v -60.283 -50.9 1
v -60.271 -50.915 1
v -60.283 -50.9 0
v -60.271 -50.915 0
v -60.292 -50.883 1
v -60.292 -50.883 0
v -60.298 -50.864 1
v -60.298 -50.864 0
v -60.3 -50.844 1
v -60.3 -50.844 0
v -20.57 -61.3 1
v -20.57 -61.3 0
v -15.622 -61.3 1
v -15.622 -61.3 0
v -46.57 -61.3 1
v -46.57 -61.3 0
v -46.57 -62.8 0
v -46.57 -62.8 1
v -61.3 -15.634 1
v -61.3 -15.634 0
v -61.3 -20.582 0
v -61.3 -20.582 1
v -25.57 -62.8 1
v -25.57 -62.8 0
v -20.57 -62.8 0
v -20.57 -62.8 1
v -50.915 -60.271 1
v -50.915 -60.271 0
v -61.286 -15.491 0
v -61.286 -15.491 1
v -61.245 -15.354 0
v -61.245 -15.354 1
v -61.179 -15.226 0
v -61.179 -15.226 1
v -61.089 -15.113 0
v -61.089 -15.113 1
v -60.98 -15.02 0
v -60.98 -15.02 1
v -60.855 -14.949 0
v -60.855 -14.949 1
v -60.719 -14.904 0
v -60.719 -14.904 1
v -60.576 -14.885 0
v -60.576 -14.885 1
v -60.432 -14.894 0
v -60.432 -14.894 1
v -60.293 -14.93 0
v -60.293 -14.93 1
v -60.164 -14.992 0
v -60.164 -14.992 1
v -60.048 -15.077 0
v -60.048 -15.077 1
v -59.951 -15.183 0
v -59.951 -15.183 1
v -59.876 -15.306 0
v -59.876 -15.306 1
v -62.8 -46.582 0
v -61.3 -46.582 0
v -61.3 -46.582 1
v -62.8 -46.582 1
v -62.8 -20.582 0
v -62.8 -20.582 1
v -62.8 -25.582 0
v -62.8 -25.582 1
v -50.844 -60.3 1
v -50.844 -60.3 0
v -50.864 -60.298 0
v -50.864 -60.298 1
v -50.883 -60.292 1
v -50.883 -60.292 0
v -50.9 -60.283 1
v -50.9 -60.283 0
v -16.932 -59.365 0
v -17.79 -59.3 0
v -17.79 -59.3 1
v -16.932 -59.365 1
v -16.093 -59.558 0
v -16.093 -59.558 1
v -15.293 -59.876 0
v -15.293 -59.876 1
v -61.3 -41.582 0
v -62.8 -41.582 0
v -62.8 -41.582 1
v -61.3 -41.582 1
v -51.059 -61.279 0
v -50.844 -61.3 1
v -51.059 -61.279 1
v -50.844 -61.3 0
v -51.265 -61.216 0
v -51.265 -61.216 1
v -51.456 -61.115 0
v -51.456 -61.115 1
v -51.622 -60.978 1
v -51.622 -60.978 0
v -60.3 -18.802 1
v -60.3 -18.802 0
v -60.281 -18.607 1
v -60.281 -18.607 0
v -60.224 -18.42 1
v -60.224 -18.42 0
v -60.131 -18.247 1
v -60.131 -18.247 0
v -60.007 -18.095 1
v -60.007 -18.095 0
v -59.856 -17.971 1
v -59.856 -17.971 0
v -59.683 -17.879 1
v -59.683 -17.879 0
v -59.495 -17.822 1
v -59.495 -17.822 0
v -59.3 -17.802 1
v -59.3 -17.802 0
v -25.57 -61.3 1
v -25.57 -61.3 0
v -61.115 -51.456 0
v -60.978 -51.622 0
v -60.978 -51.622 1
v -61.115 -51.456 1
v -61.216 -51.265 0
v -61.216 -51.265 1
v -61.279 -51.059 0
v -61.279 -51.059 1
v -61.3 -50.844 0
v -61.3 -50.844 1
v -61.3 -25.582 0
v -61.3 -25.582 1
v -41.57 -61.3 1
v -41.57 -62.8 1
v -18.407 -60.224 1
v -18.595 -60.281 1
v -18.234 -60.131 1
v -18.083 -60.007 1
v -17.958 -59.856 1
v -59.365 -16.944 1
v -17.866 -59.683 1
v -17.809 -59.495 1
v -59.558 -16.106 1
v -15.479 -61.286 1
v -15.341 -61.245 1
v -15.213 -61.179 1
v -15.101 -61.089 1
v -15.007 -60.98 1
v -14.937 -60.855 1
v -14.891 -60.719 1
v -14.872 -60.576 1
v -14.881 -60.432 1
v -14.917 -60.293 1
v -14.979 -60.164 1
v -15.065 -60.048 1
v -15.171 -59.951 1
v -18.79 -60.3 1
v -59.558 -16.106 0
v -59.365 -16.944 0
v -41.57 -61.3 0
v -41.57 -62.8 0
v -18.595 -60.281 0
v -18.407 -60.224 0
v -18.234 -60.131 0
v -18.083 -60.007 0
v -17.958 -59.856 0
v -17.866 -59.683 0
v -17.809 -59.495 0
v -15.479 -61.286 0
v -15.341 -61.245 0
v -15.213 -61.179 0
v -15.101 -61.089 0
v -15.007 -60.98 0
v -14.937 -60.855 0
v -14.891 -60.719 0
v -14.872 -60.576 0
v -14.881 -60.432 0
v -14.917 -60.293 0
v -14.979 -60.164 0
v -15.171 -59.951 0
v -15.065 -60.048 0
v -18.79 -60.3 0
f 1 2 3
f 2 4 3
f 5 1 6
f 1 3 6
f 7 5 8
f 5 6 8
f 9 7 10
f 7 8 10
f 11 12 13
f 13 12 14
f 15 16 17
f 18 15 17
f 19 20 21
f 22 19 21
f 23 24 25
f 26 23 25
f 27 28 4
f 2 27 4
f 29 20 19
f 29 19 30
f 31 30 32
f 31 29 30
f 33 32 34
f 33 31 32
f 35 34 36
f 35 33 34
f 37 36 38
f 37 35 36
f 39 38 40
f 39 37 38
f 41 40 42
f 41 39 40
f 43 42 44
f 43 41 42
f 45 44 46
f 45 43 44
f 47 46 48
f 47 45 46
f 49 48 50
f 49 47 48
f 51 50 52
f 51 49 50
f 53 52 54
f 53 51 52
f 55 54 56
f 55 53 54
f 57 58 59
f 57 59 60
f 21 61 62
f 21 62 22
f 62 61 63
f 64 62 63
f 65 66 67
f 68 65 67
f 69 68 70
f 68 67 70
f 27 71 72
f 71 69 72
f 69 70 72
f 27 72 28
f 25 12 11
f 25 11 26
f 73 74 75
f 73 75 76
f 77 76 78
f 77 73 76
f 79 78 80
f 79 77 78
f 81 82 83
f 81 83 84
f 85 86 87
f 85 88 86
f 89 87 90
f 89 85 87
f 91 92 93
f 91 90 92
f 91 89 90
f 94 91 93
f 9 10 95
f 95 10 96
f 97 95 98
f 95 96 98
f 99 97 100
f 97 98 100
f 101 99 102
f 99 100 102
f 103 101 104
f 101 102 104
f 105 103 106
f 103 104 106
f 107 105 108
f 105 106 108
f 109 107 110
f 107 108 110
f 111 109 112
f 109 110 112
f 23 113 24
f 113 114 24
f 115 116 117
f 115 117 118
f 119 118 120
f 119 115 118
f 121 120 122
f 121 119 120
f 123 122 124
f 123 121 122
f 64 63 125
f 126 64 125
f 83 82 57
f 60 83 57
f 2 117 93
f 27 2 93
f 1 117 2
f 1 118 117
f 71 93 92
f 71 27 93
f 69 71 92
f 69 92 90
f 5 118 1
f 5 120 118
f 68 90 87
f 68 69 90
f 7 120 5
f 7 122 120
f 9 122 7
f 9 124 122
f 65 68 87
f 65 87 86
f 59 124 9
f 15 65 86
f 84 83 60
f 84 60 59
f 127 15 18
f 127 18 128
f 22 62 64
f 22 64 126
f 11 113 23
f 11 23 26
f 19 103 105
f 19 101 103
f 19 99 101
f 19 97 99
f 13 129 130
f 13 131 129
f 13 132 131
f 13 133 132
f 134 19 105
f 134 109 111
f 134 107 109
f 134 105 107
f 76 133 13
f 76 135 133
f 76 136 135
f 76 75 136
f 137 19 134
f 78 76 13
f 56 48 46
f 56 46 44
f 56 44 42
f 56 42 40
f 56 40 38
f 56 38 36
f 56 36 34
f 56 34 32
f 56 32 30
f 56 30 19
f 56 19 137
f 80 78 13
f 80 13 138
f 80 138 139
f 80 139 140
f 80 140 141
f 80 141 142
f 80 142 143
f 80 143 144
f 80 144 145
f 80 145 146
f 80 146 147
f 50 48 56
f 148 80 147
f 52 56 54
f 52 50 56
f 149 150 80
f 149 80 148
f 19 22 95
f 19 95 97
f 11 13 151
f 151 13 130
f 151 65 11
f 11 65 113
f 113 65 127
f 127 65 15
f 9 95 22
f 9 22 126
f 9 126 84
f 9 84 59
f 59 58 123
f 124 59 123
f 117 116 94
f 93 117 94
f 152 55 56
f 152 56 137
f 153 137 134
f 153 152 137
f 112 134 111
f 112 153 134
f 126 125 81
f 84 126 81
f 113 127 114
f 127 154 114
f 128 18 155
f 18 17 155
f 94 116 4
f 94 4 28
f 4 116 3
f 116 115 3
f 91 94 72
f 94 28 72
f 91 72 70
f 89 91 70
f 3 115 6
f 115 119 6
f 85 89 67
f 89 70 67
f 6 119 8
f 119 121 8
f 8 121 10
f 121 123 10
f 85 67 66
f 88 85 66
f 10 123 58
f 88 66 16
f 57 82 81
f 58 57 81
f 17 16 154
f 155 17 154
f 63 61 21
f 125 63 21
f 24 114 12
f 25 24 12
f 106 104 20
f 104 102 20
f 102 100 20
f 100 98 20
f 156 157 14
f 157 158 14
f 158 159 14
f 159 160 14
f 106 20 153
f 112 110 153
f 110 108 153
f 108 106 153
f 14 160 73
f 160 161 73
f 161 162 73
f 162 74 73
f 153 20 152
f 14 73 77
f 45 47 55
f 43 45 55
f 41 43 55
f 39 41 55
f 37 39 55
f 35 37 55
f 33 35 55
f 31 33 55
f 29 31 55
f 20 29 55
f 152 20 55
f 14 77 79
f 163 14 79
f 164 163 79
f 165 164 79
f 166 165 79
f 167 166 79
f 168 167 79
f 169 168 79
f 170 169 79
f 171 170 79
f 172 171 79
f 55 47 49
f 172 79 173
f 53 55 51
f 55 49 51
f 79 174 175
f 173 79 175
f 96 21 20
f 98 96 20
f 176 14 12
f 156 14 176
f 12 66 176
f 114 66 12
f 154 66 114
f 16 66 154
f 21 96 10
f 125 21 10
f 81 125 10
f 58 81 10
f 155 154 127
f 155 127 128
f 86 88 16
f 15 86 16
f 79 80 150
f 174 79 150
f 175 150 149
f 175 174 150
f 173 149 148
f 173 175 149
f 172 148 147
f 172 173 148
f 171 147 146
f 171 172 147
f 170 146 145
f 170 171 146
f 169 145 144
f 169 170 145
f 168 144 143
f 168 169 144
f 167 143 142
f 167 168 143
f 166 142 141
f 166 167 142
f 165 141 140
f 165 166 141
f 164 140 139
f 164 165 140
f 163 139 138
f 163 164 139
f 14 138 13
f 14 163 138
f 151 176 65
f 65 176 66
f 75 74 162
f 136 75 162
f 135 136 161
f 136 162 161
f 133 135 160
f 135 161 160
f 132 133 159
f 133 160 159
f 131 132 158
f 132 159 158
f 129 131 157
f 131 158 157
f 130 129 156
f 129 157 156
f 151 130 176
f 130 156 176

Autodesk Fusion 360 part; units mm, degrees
sketch "Sketch1" plane through (0, 0, 0) normal (0, 0, 1) x (1, 0, 0)
  line L0 (-60.9778, -51.3602) -> (-51.369, -60.969)
  arc A0 (-51.369, -60.969) -> (-50.57, -61.3) centre (-50.57, -60.17) ccw
  line L1 (-50.8444, -61.3) -> (-15.6217, -61.3)
  arc A1 (-15.2933, -59.8758) -> (-17.7897, -59.3) centre (-17.7897, -65) ccw
  arc A2 (-18.7897, -60.3) -> (-17.7897, -59.3) centre (-18.7897, -59.3) ccw
  line L2 (-18.7897, -60.3) -> (-50.8444, -60.3)
  arc A3 (-50.6619, -60.2619) -> (-50.57, -60.3) centre (-50.57, -60.17) ccw
  line L3 (-50.6619, -60.2619) -> (-60.2707, -50.6531)
  arc A4 (-60.3, -50.5824) -> (-60.2707, -50.6531) centre (-60.2, -50.5824) ccw
  line L4 (-60.3, -50.8444) -> (-60.3, -18.8024)
  arc A5 (-59.3, -17.8024) -> (-60.3, -18.8024) centre (-59.3, -18.8024) ccw
  arc A6 (-59.3, -17.8024) -> (-59.8758, -15.306) centre (-65, -17.8024) ccw
  line L5 (-61.3, -15.6345) -> (-61.3, -50.8444)
  arc A7 (-61.3, -50.5824) -> (-60.9778, -51.3602) centre (-60.2, -50.5824) ccw
  arc A8 (-15.6217, -61.3) -> (-15.2933, -59.8758) centre (-15.6217, -60.55) ccw
  arc A9 (-59.8758, -15.306) -> (-61.3, -15.6345) centre (-60.55, -15.6345) ccw
  line L6 (-62.8, -15.6345) -> (-62.8, -50.8444)
  line L7 (-50.8444, -62.8) -> (-15.6217, -62.8)
  line L8 (-61.3, -46.5824) -> (-62.8, -46.5824)
  line L9 (-62.8, -41.5824) -> (-61.3, -41.5824)
  line L10 (-62.8, -20.5824) -> (-61.3, -20.5824)
  line L11 (-62.8, -25.5824) -> (-61.3, -25.5824)
  line L12 (-46.57, -61.3) -> (-46.57, -62.8)
  line L13 (-41.57, -61.3) -> (-41.57, -62.8)
  line L14 (-25.57, -61.3) -> (-25.57, -62.8)
  line L15 (-20.57, -61.3) -> (-20.57, -62.8)
  arc A10 (-51.6222, -60.9778) -> (-50.8444, -61.3) centre (-50.8444, -60.2) ccw
  line L16 (-60.9778, -51.6222) -> (-51.6222, -60.9778)
  arc A11 (-61.3, -50.8444) -> (-60.9778, -51.6222) centre (-60.2, -50.8444) ccw
  arc A12 (-60.3, -50.8444) -> (-60.2707, -50.9151) centre (-60.2, -50.8444) ccw
  line L17 (-50.9151, -60.2707) -> (-60.2707, -50.9151)
  arc A13 (-50.9151, -60.2707) -> (-50.8444, -60.3) centre (-50.8444, -60.2) ccw
  dimension "d1" = 60.3
  dimension "d2" = 60.3
  dimension "d3" = 1
  dimension "d4" = 1
  dimension "d5" = 1
  dimension "d6" = 5.7
  dimension "d7" = 0.75
  dimension "d8" = 3.7
  dimension "d9" = 1.13
  dimension "d10" = 1.1
  dimension "d11" = 45
  dimension "d12" = 50.57
  dimension "d13" = 31.7803
  dimension "d14" = 1
  dimension "d15" = 31.78
  dimension "d16" = 1
  dimension "d17" = 5.7
  dimension "d18" = 3.7
  dimension "d19" = 1
  dimension "d21" = 0.75
  dimension "d22" = 1.5
  dimension "d23" = 1.5
  dimension "d24" = 4
  dimension "d25" = 4
  dimension "d26" = 5
  dimension "d27" = 5
  dimension "d28" = 16
  dimension "d29" = 5
  dimension "d30" = 16
  dimension "d31" = 5
extrude "Extrude1" add sketch "Sketch1" along normal blind 1 contours L0 A0 L1 A1 A2 L2 L4 A5 A6 L5 A7 A8 A9 A12 L17 A13 | L0 A0 L1 L5 A7 A10 L16 A11 | L5 L6 L8 L9 | L1 L7 L12 L13 | L5 L6 L10 L11 | L1 L7 L14 L15
